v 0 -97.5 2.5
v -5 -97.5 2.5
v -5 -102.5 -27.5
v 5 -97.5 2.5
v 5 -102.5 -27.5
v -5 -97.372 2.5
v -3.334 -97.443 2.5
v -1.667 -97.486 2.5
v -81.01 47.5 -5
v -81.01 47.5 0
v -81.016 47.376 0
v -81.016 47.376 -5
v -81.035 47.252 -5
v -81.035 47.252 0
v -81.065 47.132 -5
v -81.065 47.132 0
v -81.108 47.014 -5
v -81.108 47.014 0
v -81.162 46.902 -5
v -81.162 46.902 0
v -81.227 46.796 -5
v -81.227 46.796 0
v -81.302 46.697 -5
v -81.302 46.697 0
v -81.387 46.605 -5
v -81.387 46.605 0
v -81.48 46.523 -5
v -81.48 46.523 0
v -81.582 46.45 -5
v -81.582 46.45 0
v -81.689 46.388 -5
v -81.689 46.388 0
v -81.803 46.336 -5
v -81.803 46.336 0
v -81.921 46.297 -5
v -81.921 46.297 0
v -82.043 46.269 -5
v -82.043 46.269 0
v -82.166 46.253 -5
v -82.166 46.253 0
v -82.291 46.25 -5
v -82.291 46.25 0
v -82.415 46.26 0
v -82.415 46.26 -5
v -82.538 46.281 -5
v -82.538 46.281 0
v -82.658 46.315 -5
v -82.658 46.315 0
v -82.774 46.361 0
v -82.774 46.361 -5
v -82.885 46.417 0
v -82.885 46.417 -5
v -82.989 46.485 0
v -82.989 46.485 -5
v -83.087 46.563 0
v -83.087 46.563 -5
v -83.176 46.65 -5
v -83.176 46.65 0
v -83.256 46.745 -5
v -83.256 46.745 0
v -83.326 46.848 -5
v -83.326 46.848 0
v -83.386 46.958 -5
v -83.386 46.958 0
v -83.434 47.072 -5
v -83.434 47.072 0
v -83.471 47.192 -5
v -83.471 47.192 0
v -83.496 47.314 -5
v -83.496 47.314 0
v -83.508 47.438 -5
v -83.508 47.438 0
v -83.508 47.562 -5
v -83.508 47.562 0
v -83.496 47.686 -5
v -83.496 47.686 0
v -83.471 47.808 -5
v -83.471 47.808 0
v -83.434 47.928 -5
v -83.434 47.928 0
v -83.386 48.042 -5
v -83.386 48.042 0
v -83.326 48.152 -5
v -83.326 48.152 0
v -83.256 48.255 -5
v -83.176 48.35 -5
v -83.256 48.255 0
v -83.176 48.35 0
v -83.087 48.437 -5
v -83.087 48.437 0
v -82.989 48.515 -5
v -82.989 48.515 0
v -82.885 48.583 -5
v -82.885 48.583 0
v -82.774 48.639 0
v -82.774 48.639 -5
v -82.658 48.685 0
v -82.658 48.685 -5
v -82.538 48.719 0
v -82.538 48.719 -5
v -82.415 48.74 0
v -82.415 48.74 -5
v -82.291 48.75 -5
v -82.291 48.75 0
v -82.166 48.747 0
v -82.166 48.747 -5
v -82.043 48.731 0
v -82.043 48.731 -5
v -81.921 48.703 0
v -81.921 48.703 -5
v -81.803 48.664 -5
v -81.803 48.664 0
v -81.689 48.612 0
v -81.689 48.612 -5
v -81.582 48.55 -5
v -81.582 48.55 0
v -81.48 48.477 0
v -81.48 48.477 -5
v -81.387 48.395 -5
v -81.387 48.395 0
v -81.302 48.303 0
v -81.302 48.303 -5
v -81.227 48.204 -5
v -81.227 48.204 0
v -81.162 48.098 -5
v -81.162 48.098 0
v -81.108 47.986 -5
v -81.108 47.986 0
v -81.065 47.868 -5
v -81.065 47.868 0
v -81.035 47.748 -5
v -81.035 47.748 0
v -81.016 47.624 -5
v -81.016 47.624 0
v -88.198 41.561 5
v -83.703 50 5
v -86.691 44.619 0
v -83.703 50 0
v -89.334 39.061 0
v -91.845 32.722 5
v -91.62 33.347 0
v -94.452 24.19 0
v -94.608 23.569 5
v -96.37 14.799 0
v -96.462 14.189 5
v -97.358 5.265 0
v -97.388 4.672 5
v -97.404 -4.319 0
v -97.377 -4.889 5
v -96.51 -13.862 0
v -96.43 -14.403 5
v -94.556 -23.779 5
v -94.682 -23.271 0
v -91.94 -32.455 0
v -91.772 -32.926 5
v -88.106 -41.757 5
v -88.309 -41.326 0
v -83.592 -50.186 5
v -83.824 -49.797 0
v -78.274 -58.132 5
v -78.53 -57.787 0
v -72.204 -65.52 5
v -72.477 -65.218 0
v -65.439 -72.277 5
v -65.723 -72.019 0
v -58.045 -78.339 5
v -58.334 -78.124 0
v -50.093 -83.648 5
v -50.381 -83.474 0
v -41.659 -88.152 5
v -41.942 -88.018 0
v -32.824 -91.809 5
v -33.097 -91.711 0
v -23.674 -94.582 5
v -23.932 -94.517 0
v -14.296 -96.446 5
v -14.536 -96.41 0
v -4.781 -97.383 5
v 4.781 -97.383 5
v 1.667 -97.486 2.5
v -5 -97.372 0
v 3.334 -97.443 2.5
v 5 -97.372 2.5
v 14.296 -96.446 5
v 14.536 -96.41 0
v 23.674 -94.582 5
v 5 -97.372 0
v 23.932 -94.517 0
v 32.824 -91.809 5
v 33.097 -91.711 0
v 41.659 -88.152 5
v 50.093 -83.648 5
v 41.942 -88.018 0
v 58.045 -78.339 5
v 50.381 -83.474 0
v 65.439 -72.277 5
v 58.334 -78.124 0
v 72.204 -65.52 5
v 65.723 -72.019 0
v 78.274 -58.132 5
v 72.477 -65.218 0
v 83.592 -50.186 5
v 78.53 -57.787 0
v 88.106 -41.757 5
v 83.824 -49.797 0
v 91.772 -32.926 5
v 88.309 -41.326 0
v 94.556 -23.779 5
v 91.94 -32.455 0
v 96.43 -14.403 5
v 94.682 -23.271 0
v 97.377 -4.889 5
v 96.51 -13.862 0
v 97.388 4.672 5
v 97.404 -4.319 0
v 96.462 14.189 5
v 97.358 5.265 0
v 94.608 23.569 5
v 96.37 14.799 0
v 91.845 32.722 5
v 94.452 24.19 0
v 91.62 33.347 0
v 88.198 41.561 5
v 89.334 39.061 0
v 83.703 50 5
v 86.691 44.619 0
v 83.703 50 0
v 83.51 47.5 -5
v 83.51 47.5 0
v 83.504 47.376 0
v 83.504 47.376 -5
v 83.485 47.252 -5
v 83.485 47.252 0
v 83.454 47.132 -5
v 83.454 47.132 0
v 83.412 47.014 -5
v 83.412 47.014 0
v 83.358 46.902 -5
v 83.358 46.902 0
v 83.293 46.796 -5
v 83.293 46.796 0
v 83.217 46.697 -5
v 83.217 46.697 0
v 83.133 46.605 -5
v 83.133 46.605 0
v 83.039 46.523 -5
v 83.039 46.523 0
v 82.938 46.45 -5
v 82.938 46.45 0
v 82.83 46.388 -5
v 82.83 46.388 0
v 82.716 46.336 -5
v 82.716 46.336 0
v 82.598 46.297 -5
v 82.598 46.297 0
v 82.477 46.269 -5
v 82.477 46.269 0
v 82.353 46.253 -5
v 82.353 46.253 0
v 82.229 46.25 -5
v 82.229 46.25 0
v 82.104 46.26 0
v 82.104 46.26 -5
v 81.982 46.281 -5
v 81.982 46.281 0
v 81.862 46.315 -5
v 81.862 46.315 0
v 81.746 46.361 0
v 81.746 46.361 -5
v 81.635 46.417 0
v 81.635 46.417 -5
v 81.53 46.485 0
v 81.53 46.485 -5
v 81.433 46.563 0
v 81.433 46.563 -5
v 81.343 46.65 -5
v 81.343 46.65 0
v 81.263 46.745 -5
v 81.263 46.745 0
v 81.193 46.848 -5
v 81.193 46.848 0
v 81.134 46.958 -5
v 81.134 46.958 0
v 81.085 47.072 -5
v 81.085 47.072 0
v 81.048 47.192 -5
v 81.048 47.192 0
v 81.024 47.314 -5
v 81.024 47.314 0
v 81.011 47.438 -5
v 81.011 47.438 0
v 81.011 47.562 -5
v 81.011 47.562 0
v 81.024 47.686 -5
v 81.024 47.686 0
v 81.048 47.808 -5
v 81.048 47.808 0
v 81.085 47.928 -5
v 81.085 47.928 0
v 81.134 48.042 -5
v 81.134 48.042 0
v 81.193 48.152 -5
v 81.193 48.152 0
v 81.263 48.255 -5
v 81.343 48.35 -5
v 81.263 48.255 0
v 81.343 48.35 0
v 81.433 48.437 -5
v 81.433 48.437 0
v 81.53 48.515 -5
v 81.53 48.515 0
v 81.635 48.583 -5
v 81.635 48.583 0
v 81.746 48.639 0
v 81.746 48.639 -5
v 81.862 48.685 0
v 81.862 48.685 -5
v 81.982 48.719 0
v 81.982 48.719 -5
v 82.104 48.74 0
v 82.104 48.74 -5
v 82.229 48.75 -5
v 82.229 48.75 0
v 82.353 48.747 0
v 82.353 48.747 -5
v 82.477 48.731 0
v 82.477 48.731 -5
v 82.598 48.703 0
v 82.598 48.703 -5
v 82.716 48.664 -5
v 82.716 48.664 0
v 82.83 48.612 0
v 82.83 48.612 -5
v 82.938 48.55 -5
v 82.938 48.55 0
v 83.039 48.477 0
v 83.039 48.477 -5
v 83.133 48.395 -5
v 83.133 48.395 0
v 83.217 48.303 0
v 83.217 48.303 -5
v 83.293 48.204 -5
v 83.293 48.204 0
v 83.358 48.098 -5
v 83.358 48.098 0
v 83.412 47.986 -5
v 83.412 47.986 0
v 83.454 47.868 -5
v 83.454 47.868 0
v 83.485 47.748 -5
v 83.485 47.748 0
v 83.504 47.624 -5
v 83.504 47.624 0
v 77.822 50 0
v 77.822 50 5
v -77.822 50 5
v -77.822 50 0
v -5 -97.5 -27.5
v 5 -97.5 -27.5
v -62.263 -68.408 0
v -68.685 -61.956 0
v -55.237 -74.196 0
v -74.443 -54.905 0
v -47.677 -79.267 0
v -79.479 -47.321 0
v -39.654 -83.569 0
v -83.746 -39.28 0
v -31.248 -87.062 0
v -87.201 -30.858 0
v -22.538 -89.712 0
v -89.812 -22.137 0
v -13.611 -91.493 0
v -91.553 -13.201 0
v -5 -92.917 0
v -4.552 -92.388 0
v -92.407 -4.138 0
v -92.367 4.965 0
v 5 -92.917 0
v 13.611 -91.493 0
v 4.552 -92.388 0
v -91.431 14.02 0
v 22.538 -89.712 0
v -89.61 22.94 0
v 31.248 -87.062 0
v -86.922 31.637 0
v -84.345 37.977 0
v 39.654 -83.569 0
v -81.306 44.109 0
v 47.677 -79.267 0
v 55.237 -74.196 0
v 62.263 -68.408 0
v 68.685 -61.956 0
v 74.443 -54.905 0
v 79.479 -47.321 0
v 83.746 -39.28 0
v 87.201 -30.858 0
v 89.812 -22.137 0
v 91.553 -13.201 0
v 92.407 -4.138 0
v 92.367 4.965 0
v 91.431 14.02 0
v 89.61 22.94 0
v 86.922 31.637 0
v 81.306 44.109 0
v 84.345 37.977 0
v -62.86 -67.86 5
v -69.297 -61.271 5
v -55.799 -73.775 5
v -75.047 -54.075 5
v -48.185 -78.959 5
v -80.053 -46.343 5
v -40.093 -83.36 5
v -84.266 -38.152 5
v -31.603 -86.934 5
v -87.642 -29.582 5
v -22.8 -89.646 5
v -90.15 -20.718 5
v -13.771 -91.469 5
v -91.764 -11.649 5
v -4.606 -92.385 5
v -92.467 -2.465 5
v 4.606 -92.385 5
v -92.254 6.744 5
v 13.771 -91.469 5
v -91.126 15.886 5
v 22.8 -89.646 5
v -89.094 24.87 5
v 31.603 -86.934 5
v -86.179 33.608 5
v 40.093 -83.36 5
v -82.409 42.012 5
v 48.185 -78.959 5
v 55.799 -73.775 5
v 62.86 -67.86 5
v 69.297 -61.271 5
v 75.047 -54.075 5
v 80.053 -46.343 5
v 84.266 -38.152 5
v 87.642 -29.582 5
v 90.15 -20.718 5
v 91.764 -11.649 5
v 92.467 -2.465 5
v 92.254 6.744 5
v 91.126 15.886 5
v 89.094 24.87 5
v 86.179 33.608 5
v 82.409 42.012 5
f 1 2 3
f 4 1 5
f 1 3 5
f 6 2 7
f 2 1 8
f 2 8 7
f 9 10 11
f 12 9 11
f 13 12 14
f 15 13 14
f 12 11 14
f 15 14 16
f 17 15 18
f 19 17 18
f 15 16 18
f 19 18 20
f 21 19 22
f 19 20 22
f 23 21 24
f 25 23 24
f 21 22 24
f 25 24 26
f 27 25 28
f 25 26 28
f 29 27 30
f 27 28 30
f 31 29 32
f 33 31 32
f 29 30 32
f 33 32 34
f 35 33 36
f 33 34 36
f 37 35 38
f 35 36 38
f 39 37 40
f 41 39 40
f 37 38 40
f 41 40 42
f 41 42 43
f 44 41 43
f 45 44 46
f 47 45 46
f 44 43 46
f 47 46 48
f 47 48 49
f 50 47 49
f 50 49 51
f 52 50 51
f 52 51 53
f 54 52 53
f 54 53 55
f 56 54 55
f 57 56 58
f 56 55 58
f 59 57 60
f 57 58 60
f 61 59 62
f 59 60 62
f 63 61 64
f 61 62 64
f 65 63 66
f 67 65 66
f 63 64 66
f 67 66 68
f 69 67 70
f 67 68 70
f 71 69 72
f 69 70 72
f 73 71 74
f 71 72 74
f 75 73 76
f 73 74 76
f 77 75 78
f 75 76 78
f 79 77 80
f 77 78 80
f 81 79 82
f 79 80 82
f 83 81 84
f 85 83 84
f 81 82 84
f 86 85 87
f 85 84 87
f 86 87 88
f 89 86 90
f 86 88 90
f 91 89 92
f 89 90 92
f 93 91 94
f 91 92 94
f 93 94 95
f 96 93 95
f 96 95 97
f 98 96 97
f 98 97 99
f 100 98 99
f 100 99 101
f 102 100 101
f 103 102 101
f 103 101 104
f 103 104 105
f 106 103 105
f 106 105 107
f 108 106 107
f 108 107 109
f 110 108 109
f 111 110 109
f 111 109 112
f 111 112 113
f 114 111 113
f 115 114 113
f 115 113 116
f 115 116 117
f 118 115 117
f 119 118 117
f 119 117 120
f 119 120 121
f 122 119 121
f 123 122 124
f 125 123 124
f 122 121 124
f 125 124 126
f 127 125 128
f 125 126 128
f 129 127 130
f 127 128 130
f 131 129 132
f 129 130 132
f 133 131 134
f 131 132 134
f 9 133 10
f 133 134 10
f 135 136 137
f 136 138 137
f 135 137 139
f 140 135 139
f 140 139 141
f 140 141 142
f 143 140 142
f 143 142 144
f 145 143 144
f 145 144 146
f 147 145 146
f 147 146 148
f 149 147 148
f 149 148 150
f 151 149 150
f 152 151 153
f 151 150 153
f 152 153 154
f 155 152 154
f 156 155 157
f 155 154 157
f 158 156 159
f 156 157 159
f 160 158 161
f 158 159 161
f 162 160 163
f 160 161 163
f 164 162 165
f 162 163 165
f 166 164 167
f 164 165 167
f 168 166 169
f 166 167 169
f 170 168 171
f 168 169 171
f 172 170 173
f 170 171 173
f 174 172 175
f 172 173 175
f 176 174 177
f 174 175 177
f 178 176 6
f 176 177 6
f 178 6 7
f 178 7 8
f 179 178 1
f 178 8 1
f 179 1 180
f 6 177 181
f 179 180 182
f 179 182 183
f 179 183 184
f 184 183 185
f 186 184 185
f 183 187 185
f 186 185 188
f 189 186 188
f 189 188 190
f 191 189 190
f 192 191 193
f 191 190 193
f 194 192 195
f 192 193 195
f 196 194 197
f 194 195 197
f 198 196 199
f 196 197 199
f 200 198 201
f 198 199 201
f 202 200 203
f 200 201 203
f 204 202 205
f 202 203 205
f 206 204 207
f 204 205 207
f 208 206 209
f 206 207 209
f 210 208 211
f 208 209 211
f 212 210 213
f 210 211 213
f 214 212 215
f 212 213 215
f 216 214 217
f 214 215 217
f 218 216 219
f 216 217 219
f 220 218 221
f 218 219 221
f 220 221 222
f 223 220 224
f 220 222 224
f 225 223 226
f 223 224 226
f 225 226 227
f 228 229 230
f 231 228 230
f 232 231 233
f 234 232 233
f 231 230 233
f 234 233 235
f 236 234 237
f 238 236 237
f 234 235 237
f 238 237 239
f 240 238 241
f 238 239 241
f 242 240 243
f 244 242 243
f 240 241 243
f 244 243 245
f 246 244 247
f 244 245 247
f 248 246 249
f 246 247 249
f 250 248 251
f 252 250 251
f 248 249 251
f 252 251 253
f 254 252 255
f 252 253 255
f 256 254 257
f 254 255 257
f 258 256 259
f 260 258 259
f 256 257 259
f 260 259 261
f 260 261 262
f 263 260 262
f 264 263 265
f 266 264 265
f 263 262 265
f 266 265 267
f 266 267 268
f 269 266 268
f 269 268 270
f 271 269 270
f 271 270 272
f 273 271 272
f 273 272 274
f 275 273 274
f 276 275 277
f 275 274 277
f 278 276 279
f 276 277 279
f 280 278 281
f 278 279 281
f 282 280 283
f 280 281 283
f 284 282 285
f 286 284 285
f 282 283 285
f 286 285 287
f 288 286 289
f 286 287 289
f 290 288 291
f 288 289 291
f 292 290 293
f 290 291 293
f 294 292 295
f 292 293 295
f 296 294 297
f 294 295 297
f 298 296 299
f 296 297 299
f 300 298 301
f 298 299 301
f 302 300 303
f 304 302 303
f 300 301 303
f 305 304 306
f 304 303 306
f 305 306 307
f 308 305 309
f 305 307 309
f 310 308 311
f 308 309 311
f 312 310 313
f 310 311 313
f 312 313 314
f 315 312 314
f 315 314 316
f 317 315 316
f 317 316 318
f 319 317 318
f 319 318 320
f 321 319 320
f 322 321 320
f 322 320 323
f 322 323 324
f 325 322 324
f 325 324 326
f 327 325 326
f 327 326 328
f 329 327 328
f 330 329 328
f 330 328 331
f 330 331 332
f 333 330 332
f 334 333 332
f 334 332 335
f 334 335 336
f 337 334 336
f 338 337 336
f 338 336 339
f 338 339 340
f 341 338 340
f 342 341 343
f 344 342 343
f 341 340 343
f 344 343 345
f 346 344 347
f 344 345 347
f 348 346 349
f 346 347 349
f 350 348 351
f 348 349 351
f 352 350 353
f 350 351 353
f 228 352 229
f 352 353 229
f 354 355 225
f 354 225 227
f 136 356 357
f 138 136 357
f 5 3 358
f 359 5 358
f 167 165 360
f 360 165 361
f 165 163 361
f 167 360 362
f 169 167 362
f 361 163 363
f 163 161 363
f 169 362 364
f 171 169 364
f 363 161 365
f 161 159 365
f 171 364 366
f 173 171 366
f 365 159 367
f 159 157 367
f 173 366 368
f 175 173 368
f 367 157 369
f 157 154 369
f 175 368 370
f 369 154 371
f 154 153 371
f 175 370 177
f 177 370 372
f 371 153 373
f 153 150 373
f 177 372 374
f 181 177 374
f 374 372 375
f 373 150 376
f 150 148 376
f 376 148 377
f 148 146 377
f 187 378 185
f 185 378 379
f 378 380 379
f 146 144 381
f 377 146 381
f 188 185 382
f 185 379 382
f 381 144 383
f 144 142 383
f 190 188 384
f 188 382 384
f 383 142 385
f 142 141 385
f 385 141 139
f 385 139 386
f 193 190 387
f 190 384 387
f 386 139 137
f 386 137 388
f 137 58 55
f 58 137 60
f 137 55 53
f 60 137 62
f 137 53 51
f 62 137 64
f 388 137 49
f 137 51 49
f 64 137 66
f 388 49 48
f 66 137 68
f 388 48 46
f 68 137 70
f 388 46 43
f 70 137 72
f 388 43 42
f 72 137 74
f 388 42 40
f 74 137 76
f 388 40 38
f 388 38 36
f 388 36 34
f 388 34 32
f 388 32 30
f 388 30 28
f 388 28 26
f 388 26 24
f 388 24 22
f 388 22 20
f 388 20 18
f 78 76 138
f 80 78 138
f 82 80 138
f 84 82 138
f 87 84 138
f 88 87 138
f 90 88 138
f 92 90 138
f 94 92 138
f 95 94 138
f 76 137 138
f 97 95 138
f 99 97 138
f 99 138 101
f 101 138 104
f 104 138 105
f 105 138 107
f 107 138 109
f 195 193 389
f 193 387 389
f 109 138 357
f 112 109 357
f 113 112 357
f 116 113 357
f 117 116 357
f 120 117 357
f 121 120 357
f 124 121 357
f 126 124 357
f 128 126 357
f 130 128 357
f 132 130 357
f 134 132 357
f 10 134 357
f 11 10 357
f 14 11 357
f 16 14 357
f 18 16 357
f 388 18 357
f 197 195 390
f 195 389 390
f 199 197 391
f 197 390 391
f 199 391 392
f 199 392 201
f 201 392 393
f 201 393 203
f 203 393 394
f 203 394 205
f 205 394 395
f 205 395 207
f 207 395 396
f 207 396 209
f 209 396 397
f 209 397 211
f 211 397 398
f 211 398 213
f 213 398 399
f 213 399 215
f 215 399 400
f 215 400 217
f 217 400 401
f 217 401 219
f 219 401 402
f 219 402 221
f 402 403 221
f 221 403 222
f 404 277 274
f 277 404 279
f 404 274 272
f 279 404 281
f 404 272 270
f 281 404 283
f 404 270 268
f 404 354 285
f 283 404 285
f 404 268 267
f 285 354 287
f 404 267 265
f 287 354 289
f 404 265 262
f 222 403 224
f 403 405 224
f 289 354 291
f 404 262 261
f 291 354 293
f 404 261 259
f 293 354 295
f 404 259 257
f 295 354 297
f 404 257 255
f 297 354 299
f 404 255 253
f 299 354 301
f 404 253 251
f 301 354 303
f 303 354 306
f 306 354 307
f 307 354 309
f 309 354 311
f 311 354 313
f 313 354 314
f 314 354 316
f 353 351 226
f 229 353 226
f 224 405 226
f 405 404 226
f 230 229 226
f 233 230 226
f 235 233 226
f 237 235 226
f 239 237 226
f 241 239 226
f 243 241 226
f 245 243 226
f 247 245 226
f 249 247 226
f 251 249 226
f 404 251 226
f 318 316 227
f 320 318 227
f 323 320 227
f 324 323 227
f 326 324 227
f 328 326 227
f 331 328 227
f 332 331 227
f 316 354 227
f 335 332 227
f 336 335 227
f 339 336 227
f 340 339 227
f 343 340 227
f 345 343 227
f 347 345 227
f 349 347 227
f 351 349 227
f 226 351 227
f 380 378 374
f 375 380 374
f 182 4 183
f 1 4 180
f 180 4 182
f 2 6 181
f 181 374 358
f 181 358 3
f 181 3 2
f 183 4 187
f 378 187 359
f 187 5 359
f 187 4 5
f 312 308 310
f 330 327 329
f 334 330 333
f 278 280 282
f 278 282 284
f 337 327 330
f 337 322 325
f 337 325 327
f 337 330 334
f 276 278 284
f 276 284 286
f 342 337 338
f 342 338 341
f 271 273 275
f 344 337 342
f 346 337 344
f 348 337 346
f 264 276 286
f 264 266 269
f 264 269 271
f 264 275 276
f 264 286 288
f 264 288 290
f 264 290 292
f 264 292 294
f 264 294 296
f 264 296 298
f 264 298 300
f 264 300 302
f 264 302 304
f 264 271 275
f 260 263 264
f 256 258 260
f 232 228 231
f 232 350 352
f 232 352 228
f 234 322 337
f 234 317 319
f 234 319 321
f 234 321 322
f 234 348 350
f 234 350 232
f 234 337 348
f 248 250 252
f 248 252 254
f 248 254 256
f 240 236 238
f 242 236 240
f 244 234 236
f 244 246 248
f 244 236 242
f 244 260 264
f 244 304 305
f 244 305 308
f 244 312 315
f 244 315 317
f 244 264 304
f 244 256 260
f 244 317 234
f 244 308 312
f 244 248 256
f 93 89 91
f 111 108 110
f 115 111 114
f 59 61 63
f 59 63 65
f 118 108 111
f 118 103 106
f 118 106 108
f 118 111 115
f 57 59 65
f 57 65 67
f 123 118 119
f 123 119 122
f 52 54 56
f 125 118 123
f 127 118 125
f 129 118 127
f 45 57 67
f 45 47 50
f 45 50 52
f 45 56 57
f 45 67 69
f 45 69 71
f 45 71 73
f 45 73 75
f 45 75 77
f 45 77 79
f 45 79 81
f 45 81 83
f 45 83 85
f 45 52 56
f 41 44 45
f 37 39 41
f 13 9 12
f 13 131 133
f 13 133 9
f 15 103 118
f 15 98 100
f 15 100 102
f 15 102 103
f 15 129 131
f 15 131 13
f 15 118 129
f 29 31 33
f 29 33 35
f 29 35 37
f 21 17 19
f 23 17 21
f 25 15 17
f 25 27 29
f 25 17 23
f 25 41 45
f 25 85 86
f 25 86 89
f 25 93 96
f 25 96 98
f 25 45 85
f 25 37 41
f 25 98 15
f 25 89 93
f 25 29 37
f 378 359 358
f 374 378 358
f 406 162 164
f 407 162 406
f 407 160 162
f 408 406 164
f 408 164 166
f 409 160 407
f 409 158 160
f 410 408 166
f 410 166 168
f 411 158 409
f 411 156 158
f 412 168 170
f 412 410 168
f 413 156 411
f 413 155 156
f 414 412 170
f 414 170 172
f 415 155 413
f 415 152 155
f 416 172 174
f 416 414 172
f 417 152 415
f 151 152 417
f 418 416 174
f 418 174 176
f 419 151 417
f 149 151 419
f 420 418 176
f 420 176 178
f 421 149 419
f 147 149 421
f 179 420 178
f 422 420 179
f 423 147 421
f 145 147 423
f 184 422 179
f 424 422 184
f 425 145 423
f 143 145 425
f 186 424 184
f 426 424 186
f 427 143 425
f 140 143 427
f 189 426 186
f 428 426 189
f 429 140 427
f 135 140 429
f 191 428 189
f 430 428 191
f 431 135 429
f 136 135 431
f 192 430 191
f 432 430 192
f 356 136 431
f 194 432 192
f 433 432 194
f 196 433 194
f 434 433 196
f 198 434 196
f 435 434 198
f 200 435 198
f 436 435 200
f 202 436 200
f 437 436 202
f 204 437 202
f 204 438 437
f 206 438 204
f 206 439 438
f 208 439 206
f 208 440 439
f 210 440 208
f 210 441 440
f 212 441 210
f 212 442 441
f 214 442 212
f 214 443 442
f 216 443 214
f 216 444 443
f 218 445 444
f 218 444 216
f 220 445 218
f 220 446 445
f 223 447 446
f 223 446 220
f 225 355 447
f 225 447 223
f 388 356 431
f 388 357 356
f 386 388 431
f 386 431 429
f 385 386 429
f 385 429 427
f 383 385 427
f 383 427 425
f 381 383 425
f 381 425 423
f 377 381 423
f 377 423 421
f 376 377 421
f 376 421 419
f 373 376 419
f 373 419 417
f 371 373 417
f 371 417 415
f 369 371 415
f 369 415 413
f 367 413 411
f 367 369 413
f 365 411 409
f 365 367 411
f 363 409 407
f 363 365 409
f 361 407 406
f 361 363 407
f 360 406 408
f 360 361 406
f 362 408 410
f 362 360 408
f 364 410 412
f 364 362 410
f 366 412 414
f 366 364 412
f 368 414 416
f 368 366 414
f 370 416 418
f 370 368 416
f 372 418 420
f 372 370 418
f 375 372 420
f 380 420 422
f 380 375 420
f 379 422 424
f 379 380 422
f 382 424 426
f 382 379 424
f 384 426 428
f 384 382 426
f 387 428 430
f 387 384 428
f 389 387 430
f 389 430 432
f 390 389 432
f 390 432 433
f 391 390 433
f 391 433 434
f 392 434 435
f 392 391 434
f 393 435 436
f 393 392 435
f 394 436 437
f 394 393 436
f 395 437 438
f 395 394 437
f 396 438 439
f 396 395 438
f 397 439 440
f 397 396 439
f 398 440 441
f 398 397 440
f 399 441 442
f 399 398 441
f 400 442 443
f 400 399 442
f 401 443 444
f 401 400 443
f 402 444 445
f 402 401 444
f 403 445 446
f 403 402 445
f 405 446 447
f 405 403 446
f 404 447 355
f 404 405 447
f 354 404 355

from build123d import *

# Parameters (mm, degrees)
F0_R      = 97.5
F0_R_2    = 92.5
F1_DEPTH  = 5
F4_W      = 10
F4_H      = 5
F7_DEPTH  = 27.5
F10_DEPTH = 197.501
F11_R     = 1.25
F12_DEPTH = 5


with BuildPart() as f1:
    # F0 (on Top) → F1 (new body)
    with BuildSketch(Plane.XY):
        Circle(F0_R)
        Circle(F0_R_2, mode=Mode.SUBTRACT)
    extrude(amount=F1_DEPTH)

    # F5: sweep along a path in F2
    with BuildLine(Plane.YZ) as f5_path:
        Line((-95, 2.5), (-100, -27.5))
    # F4 (on plane+point) → F5 (sweep)
    with BuildSketch(Plane.XY.offset(-27.5)):
        with Locations((0, -100)):
            Rectangle(F4_W, F4_H)
    sweep(path=f5_path.line)

    # F6 (on face) → F7 (join)
    with BuildSketch(Plane(origin=(0, 0, 0), x_dir=(1, 0, 0), z_dir=(0, 0, -1))):
        with BuildLine():
            Line((-74.6893332041, -62.6717919444), (-70.8591109885, -59.457853896))
            ThreePointArc((-70.8591109885, -59.457853896), (-80.1073498501, -46.25), (-86.9215674227, -31.6368632576))
            Line((-86.9215674227, -31.6368632576), (-91.6200305266, -33.3469639743))
            ThreePointArc((-91.6200305266, -33.3469639743), (-84.437476869, -48.75), (-74.6893332041, -62.6717919444))
        make_face()
        with BuildLine():
            ThreePointArc((86.9215674227, -31.6368632576), (80.1073498501, -46.25), (70.8591109885, -59.457853896))
            Line((70.8591109885, -59.457853896), (74.6893332041, -62.6717919444))
            ThreePointArc((74.6893332041, -62.6717919444), (84.437476869, -48.75), (91.6200305266, -33.3469639743))
            Line((91.6200305266, -33.3469639743), (86.9215674227, -31.6368632576))
        make_face()
    extrude(amount=F7_DEPTH)

    # F9 (on offset) → F10 (cut, through all)
    with BuildSketch(Plane.YZ.offset(100)):
        Polygon((50, 0), (0, 0), (0, -29.4982548803), (101.8575504422, -29.4982548803), (101.8575504422, 5), (50, 5), align=None)
    extrude(amount=-F10_DEPTH, mode=Mode.SUBTRACT)

    # F11 (on face) → F12 (join)
    with BuildSketch(Plane(origin=(0, 0, 0), x_dir=(1, 0, 0), z_dir=(0, 0, -1))):
        with Locations((82.2597355808, -47.5)):
            Circle(F11_R)
        with Locations((-82.2597355808, -47.5)):
            Circle(F11_R)
    extrude(amount=F12_DEPTH)


solid = f1.part
